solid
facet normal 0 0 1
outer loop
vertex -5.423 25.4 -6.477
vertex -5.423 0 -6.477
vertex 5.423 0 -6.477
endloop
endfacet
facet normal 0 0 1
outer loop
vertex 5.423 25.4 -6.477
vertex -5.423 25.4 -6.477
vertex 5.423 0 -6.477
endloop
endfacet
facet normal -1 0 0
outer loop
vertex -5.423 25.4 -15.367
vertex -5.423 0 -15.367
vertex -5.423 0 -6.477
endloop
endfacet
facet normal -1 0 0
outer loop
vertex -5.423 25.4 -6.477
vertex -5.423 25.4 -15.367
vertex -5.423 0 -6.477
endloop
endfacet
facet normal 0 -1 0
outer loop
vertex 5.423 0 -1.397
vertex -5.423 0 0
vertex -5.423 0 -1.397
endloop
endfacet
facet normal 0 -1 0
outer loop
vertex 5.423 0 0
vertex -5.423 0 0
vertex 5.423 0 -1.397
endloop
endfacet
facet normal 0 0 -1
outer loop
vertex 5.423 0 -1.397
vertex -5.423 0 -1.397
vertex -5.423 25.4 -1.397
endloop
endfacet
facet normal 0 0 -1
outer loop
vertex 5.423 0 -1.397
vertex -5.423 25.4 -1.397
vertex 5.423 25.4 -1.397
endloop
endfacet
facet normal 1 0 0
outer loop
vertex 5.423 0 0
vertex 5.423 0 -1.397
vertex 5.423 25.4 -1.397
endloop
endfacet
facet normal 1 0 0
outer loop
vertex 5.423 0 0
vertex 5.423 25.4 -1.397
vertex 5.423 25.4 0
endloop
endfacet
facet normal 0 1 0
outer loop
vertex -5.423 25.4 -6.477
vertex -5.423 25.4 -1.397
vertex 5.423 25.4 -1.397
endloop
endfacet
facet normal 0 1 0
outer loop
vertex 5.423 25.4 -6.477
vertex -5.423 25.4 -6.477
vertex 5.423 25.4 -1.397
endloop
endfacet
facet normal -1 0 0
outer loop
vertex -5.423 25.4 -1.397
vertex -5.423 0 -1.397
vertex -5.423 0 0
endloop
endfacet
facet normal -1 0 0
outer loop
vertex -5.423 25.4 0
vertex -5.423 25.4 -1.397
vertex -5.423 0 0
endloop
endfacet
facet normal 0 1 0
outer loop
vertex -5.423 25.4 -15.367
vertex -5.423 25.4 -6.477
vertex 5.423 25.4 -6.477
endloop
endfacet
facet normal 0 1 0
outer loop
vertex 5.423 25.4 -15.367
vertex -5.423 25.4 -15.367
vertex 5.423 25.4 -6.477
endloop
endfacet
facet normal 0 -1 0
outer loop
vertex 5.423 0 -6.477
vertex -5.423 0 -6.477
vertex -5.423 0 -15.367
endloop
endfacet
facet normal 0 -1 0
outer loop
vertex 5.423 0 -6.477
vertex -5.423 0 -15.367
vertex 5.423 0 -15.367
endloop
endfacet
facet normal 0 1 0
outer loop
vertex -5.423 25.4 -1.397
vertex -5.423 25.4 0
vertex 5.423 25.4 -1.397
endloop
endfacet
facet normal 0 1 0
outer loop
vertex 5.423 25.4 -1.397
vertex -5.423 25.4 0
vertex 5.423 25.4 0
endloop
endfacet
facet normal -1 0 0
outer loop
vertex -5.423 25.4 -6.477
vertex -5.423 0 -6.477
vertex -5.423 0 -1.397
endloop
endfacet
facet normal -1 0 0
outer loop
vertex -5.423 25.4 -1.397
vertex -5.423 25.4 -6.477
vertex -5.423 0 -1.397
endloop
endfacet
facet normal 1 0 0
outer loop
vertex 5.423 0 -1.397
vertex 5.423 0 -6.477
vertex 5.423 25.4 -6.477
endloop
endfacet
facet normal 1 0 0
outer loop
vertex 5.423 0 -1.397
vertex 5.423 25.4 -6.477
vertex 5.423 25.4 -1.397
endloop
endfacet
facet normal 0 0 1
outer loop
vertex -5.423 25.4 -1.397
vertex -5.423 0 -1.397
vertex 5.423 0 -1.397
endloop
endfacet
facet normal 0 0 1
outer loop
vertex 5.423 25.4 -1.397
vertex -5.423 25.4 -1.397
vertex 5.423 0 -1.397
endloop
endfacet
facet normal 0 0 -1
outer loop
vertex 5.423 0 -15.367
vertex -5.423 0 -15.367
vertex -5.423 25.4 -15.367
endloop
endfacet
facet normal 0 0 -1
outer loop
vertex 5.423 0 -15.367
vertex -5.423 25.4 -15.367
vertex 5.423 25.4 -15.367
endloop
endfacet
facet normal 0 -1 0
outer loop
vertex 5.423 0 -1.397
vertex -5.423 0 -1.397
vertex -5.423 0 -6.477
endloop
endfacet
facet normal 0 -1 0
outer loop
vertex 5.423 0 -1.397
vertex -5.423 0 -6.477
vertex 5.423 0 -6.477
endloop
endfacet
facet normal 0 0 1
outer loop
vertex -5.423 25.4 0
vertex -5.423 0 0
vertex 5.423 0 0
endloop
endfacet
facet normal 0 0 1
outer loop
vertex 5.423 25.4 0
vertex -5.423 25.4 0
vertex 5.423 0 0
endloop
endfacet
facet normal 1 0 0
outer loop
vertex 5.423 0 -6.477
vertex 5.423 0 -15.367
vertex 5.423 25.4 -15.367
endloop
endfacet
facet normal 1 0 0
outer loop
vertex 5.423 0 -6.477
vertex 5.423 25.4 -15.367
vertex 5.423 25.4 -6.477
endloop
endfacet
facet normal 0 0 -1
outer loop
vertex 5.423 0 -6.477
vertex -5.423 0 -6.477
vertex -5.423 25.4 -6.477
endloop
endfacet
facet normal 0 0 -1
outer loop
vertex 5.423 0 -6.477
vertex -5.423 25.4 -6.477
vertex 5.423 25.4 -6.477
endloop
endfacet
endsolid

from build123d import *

# Parameters (mm, degrees)
F0_W     = 10.8458
F0_H     = 1.397
F1_DEPTH = 25.4
F2_W     = 10.8458
F2_H     = 5.08
F3_DEPTH = 25.4
F4_W     = 10.8458
F4_H     = 8.89
F5_DEPTH = 25.4


with BuildPart() as f1:
    # F0 (on Front) → F1 (new body)
    with BuildSketch(Plane.XZ):
        with Locations((0, -0.6985)):
            Rectangle(F0_W, F0_H)
    extrude(amount=-F1_DEPTH)


with BuildPart() as f3:
    # F2 (on Front) → F3 (new body)
    with BuildSketch(Plane.XZ):
        with Locations((0, -3.937)):
            Rectangle(F2_W, F2_H)
    extrude(amount=-F3_DEPTH)


with BuildPart() as f5:
    # F4 (on Front) → F5 (new body)
    with BuildSketch(Plane.XZ):
        with Locations((0, -10.922)):
            Rectangle(F4_W, F4_H)
    extrude(amount=-F5_DEPTH)


solid = Compound([f1.part, f3.part, f5.part])
